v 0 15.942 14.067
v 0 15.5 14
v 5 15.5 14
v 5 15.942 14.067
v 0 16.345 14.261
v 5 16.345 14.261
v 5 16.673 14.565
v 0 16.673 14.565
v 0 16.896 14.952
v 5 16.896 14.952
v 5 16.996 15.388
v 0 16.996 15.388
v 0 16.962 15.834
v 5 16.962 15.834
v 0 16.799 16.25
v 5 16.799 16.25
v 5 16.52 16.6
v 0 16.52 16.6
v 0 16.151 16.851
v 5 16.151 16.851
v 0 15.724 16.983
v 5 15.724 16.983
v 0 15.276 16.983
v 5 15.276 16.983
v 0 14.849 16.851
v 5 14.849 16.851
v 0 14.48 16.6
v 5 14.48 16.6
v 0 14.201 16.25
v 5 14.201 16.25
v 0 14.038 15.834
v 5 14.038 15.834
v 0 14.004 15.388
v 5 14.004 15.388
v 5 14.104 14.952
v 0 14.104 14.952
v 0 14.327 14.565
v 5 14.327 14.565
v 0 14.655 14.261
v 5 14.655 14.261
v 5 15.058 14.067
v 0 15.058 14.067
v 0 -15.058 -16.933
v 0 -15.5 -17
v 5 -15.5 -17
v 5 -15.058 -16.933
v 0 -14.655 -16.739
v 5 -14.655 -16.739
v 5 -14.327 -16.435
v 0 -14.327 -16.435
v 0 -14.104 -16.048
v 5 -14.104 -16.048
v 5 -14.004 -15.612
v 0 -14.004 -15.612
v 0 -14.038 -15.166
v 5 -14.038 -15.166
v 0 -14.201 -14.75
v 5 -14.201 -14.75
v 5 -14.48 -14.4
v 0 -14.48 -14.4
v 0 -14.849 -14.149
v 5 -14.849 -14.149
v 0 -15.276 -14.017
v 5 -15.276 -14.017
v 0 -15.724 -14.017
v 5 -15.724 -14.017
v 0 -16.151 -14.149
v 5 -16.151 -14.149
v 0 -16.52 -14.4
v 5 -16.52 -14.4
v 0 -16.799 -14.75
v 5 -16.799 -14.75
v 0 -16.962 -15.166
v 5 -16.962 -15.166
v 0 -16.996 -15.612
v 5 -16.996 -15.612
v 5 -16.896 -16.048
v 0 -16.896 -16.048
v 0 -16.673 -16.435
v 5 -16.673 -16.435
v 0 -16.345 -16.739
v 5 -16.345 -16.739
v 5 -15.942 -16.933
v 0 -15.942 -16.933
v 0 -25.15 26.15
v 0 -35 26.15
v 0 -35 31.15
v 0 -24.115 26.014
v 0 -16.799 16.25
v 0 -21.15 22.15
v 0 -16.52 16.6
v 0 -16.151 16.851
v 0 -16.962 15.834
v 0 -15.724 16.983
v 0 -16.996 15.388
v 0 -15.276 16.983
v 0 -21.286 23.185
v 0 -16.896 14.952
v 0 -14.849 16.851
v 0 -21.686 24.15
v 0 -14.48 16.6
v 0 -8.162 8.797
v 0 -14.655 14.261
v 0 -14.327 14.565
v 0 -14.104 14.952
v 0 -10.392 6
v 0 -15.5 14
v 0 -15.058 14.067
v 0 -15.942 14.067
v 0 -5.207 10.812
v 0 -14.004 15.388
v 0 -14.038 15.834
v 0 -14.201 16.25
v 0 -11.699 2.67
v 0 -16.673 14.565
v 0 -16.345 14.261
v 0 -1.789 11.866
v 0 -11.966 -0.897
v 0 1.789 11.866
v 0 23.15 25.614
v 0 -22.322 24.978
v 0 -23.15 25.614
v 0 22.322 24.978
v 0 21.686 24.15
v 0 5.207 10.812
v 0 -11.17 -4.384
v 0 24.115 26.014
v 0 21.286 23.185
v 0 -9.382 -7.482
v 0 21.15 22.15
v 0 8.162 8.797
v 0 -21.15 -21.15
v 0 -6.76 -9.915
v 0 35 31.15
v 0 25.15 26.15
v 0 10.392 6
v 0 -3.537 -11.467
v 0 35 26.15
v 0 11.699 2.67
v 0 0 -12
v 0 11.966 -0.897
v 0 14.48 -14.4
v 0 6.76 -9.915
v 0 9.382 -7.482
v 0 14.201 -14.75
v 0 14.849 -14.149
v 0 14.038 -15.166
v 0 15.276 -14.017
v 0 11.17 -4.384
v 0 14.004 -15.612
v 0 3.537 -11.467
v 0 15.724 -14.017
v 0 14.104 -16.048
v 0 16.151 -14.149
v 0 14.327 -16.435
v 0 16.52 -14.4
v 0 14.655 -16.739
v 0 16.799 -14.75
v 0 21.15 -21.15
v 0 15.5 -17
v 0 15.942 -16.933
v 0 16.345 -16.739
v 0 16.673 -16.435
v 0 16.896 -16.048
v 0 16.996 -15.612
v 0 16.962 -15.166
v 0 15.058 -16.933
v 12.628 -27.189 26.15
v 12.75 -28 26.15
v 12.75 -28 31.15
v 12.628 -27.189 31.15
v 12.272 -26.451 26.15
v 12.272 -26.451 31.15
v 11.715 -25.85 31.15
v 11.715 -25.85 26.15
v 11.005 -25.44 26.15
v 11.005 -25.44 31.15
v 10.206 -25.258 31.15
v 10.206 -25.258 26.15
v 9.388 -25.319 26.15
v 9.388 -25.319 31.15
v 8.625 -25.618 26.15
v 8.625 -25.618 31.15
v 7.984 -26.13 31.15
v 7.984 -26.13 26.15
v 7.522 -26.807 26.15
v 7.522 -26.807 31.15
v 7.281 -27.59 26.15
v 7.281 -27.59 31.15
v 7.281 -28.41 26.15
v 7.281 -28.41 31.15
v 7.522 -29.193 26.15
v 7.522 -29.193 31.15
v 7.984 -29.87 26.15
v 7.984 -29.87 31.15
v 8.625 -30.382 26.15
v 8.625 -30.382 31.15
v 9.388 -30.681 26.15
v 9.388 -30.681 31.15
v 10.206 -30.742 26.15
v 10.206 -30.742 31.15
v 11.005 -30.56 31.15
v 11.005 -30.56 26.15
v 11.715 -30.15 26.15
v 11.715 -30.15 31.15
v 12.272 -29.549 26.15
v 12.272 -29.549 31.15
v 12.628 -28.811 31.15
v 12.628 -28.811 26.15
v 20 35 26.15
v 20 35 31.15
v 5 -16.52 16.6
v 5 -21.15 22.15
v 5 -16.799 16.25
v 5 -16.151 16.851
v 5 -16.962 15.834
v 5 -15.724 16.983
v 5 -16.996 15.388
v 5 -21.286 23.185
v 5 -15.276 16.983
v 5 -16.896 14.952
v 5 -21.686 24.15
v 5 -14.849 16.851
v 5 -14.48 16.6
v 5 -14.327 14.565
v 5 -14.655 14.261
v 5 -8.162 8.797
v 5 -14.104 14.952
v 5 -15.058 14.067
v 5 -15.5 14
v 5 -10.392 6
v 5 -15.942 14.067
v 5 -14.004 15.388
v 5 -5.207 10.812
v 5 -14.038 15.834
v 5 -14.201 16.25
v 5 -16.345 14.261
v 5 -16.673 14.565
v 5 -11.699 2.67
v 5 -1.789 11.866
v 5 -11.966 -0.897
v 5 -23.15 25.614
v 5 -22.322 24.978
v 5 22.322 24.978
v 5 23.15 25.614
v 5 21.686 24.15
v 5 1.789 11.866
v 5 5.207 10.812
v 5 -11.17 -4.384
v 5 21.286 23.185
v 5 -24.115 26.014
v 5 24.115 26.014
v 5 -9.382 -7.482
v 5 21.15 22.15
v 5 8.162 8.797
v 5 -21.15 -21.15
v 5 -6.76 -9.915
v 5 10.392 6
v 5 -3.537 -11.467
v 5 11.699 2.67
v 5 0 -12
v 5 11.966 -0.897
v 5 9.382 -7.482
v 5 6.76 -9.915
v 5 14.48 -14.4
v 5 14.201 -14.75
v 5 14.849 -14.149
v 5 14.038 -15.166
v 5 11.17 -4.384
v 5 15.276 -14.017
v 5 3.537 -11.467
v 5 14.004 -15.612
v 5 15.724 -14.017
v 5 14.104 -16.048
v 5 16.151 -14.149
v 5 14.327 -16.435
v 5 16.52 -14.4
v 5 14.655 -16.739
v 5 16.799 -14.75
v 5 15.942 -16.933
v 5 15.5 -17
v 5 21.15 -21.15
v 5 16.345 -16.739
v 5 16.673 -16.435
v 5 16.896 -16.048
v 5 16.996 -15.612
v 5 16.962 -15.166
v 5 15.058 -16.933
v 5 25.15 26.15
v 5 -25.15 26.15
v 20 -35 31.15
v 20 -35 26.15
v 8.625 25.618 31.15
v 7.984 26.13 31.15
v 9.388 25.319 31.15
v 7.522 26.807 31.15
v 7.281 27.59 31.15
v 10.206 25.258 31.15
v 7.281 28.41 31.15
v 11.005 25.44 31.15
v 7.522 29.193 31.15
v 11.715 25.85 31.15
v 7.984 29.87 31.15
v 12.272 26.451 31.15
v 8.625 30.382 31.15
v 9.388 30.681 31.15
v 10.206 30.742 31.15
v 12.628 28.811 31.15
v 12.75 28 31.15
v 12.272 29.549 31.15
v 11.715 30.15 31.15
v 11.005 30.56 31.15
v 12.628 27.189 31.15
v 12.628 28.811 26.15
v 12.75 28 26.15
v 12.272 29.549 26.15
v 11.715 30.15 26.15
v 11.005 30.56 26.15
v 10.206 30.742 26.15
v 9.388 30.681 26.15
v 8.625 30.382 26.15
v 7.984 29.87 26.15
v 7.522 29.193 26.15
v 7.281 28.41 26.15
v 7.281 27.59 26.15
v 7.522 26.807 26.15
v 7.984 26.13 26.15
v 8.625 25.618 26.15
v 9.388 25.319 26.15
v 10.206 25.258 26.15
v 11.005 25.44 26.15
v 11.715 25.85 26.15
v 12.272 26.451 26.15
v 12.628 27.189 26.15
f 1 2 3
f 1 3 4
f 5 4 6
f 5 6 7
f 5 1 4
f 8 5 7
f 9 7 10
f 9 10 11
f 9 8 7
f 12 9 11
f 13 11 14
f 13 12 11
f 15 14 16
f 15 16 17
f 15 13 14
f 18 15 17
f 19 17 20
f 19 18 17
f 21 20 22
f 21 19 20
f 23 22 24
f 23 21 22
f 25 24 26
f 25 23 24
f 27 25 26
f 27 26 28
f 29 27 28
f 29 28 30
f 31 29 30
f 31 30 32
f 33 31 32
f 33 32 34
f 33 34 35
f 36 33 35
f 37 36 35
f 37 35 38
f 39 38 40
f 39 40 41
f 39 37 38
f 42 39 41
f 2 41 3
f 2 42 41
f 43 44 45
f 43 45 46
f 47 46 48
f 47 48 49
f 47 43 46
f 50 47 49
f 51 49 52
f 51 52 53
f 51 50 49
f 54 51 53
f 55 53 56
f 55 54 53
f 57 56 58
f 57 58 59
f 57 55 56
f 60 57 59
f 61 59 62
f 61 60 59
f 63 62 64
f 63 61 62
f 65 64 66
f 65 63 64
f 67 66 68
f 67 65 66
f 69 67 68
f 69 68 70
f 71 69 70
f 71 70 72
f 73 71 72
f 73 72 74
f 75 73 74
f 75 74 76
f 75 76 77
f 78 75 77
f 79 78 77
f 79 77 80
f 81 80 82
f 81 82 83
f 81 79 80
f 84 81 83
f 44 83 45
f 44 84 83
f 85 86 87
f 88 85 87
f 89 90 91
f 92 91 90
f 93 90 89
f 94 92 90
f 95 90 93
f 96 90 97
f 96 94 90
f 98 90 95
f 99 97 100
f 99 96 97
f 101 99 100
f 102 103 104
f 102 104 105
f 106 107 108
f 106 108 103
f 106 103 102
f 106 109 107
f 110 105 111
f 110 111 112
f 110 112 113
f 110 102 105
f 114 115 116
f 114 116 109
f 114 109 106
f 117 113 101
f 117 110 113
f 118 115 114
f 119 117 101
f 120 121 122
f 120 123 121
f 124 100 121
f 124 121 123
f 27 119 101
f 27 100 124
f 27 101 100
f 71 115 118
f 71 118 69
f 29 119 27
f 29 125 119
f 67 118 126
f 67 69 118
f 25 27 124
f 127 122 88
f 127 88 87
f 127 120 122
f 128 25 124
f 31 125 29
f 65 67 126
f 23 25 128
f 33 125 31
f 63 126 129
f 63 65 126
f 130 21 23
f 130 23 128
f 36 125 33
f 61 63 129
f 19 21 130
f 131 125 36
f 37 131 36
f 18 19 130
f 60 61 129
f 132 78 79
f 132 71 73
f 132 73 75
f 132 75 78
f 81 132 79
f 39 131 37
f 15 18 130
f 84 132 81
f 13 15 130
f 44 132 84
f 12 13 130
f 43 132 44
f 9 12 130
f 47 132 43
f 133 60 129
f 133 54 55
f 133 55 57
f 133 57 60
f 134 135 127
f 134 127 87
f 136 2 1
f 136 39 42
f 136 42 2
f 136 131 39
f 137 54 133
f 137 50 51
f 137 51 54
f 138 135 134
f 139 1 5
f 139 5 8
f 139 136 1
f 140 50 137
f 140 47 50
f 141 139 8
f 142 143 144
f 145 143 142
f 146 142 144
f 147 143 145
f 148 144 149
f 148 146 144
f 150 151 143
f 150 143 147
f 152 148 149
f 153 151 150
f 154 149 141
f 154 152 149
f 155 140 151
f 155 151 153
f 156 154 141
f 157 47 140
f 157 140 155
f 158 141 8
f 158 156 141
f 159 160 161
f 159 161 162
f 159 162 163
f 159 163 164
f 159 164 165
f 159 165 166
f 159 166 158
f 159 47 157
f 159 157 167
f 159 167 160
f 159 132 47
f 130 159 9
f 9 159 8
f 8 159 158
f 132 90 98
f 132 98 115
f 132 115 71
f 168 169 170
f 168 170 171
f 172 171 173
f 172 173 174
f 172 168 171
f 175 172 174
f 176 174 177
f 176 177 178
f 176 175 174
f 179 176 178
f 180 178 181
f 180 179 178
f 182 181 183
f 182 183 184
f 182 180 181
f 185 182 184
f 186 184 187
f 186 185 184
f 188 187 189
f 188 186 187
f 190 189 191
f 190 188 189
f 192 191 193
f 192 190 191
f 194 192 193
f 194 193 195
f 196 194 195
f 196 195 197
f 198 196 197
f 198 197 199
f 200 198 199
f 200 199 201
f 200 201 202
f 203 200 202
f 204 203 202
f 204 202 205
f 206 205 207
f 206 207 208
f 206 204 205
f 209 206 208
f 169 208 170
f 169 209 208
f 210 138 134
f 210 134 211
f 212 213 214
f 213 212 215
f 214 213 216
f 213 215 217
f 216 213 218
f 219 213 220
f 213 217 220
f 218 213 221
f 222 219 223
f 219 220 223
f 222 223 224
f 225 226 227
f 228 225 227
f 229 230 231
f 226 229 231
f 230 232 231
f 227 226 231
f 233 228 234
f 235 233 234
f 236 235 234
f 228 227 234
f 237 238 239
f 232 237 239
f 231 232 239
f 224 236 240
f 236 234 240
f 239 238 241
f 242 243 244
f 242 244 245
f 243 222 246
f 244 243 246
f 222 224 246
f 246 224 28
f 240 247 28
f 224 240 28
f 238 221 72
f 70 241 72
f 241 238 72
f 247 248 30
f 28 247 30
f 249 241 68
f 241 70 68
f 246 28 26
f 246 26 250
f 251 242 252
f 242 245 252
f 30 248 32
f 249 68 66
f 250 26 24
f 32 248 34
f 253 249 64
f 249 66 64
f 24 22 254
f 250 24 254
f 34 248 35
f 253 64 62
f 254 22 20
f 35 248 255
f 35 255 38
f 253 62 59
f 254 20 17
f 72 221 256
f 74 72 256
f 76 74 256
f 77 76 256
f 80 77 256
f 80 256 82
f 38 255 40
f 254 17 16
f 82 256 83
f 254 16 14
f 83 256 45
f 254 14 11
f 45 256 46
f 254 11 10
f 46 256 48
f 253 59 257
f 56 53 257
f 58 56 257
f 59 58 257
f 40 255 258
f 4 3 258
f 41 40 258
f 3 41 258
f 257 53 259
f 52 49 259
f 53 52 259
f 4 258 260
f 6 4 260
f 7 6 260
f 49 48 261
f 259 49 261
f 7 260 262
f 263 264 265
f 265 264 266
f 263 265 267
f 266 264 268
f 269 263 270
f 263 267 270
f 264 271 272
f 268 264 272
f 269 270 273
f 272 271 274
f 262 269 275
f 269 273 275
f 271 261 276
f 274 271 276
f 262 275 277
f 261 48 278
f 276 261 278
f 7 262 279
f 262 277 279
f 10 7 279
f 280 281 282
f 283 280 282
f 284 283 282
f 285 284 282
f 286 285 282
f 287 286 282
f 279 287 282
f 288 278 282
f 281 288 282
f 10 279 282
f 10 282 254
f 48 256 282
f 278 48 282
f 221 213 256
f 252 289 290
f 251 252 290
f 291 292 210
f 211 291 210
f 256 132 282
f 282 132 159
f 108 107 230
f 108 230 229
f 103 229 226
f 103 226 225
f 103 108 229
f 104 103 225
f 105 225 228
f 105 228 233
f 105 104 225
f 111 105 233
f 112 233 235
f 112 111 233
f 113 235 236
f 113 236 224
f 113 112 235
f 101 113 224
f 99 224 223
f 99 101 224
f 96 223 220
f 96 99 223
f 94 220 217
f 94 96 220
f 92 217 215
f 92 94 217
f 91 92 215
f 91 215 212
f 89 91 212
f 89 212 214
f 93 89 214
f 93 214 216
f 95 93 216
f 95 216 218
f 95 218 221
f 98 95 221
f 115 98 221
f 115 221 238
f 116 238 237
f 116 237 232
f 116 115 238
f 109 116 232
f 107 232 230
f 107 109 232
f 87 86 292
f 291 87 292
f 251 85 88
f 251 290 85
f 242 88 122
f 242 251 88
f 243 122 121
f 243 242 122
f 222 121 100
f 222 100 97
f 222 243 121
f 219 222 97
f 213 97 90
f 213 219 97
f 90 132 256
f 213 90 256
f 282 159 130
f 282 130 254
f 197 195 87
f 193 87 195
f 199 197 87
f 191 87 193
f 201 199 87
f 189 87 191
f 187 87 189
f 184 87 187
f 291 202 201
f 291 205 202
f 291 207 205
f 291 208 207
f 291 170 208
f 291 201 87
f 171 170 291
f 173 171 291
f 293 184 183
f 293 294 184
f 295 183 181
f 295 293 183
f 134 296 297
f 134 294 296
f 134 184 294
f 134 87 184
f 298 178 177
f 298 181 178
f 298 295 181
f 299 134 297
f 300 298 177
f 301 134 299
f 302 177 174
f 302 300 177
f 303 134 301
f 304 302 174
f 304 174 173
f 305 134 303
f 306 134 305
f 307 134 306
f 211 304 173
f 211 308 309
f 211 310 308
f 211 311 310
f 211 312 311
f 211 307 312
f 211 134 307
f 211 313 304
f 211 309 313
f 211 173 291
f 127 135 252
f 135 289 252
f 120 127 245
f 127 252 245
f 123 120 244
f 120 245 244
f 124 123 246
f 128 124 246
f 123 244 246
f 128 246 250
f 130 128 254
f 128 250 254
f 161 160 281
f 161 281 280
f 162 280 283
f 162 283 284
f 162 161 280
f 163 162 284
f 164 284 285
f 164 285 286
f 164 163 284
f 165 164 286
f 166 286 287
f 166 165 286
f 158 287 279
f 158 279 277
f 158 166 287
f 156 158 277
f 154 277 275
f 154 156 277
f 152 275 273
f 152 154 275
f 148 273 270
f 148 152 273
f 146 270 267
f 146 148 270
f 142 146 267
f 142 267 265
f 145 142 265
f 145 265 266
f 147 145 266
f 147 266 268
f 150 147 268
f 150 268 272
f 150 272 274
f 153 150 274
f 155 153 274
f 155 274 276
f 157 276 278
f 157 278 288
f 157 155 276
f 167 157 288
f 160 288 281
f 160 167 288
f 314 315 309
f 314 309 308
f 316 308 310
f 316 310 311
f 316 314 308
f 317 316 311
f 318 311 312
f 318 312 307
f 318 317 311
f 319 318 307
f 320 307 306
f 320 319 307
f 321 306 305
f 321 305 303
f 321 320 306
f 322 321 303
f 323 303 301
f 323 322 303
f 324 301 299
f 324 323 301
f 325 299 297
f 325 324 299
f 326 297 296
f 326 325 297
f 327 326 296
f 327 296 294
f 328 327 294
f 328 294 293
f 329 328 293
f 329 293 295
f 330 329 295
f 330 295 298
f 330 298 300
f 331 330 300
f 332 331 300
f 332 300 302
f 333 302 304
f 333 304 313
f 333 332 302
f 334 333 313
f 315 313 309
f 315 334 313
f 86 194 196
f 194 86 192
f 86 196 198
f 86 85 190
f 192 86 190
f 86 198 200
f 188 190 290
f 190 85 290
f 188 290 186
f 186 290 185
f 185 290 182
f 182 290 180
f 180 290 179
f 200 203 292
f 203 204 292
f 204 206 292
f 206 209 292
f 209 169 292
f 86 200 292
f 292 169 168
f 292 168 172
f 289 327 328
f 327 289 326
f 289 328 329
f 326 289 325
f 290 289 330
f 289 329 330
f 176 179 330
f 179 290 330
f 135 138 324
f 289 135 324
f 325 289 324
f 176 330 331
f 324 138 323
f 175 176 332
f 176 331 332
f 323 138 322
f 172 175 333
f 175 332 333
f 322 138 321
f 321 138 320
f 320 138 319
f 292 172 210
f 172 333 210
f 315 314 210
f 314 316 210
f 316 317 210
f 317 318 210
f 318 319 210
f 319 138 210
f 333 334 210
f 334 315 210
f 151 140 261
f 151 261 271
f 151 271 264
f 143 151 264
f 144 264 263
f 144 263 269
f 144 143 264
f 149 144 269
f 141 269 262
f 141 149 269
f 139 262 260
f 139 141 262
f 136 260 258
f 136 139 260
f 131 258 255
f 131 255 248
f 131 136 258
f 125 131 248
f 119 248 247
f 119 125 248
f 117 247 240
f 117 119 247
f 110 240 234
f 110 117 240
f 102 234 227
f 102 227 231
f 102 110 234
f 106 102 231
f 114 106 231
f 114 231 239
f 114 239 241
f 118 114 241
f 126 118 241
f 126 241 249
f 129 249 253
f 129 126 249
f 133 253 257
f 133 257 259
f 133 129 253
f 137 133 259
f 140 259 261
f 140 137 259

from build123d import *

# Parameters (mm, degrees)
SKETCH2_W           = 42.3
SKETCH2_H           = 42.3
SKETCH2_R           = 1.5
SKETCH2_R_2         = 12
BOSS_EXTRUDE1_DEPTH = 5
SKETCH5_W           = 5
SKETCH5_H           = 42.3
BOSS_EXTRUDE3_DEPTH = 5
SKETCH3_W           = 20
SKETCH3_H           = 70
SKETCH3_R           = 2.75
BOSS_EXTRUDE2_DEPTH = 5
FILLET1_R           = 4


with BuildPart() as part:
    # Sketch2 → Boss-Extrude1 (new body)
    with BuildSketch(Plane(origin=(0, 0, 0), x_dir=(0, 0, -1), z_dir=(1, 0, 0))):
        Rectangle(SKETCH2_W, SKETCH2_H)
        with Locations((-15.5, 15.5)):
            Circle(SKETCH2_R, mode=Mode.SUBTRACT)
        with Locations((15.5, 15.5)):
            Circle(SKETCH2_R, mode=Mode.SUBTRACT)
        with Locations((15.5, -15.5)):
            Circle(SKETCH2_R, mode=Mode.SUBTRACT)
        with Locations((-15.5, -15.5)):
            Circle(SKETCH2_R, mode=Mode.SUBTRACT)
        Circle(SKETCH2_R_2, mode=Mode.SUBTRACT)
    extrude(amount=BOSS_EXTRUDE1_DEPTH)

    # Sketch5 → Boss-Extrude3 (add)
    with BuildSketch(Plane.XY.offset(21.15)):
        with Locations((2.5, 0)):
            Rectangle(SKETCH5_W, SKETCH5_H)
    extrude(amount=BOSS_EXTRUDE3_DEPTH)

    # Sketch3 → Boss-Extrude2 (add)
    with BuildSketch(Plane.XY.offset(26.15)):
        with Locations((10, 0)):
            Rectangle(SKETCH3_W, SKETCH3_H)
        with Locations((10, 28)):
            Circle(SKETCH3_R, mode=Mode.SUBTRACT)
        with Locations((10, -28)):
            Circle(SKETCH3_R, mode=Mode.SUBTRACT)
    extrude(amount=BOSS_EXTRUDE2_DEPTH)

    # Fillet1
    fillet1_edges = [part.edges().sort_by_distance(p)[0] for p in [
        (2.5, -21.15, 26.15),
        (2.5, 21.15, 26.15),
    ]]
    fillet(fillet1_edges, radius=FILLET1_R)


solid = part.part
